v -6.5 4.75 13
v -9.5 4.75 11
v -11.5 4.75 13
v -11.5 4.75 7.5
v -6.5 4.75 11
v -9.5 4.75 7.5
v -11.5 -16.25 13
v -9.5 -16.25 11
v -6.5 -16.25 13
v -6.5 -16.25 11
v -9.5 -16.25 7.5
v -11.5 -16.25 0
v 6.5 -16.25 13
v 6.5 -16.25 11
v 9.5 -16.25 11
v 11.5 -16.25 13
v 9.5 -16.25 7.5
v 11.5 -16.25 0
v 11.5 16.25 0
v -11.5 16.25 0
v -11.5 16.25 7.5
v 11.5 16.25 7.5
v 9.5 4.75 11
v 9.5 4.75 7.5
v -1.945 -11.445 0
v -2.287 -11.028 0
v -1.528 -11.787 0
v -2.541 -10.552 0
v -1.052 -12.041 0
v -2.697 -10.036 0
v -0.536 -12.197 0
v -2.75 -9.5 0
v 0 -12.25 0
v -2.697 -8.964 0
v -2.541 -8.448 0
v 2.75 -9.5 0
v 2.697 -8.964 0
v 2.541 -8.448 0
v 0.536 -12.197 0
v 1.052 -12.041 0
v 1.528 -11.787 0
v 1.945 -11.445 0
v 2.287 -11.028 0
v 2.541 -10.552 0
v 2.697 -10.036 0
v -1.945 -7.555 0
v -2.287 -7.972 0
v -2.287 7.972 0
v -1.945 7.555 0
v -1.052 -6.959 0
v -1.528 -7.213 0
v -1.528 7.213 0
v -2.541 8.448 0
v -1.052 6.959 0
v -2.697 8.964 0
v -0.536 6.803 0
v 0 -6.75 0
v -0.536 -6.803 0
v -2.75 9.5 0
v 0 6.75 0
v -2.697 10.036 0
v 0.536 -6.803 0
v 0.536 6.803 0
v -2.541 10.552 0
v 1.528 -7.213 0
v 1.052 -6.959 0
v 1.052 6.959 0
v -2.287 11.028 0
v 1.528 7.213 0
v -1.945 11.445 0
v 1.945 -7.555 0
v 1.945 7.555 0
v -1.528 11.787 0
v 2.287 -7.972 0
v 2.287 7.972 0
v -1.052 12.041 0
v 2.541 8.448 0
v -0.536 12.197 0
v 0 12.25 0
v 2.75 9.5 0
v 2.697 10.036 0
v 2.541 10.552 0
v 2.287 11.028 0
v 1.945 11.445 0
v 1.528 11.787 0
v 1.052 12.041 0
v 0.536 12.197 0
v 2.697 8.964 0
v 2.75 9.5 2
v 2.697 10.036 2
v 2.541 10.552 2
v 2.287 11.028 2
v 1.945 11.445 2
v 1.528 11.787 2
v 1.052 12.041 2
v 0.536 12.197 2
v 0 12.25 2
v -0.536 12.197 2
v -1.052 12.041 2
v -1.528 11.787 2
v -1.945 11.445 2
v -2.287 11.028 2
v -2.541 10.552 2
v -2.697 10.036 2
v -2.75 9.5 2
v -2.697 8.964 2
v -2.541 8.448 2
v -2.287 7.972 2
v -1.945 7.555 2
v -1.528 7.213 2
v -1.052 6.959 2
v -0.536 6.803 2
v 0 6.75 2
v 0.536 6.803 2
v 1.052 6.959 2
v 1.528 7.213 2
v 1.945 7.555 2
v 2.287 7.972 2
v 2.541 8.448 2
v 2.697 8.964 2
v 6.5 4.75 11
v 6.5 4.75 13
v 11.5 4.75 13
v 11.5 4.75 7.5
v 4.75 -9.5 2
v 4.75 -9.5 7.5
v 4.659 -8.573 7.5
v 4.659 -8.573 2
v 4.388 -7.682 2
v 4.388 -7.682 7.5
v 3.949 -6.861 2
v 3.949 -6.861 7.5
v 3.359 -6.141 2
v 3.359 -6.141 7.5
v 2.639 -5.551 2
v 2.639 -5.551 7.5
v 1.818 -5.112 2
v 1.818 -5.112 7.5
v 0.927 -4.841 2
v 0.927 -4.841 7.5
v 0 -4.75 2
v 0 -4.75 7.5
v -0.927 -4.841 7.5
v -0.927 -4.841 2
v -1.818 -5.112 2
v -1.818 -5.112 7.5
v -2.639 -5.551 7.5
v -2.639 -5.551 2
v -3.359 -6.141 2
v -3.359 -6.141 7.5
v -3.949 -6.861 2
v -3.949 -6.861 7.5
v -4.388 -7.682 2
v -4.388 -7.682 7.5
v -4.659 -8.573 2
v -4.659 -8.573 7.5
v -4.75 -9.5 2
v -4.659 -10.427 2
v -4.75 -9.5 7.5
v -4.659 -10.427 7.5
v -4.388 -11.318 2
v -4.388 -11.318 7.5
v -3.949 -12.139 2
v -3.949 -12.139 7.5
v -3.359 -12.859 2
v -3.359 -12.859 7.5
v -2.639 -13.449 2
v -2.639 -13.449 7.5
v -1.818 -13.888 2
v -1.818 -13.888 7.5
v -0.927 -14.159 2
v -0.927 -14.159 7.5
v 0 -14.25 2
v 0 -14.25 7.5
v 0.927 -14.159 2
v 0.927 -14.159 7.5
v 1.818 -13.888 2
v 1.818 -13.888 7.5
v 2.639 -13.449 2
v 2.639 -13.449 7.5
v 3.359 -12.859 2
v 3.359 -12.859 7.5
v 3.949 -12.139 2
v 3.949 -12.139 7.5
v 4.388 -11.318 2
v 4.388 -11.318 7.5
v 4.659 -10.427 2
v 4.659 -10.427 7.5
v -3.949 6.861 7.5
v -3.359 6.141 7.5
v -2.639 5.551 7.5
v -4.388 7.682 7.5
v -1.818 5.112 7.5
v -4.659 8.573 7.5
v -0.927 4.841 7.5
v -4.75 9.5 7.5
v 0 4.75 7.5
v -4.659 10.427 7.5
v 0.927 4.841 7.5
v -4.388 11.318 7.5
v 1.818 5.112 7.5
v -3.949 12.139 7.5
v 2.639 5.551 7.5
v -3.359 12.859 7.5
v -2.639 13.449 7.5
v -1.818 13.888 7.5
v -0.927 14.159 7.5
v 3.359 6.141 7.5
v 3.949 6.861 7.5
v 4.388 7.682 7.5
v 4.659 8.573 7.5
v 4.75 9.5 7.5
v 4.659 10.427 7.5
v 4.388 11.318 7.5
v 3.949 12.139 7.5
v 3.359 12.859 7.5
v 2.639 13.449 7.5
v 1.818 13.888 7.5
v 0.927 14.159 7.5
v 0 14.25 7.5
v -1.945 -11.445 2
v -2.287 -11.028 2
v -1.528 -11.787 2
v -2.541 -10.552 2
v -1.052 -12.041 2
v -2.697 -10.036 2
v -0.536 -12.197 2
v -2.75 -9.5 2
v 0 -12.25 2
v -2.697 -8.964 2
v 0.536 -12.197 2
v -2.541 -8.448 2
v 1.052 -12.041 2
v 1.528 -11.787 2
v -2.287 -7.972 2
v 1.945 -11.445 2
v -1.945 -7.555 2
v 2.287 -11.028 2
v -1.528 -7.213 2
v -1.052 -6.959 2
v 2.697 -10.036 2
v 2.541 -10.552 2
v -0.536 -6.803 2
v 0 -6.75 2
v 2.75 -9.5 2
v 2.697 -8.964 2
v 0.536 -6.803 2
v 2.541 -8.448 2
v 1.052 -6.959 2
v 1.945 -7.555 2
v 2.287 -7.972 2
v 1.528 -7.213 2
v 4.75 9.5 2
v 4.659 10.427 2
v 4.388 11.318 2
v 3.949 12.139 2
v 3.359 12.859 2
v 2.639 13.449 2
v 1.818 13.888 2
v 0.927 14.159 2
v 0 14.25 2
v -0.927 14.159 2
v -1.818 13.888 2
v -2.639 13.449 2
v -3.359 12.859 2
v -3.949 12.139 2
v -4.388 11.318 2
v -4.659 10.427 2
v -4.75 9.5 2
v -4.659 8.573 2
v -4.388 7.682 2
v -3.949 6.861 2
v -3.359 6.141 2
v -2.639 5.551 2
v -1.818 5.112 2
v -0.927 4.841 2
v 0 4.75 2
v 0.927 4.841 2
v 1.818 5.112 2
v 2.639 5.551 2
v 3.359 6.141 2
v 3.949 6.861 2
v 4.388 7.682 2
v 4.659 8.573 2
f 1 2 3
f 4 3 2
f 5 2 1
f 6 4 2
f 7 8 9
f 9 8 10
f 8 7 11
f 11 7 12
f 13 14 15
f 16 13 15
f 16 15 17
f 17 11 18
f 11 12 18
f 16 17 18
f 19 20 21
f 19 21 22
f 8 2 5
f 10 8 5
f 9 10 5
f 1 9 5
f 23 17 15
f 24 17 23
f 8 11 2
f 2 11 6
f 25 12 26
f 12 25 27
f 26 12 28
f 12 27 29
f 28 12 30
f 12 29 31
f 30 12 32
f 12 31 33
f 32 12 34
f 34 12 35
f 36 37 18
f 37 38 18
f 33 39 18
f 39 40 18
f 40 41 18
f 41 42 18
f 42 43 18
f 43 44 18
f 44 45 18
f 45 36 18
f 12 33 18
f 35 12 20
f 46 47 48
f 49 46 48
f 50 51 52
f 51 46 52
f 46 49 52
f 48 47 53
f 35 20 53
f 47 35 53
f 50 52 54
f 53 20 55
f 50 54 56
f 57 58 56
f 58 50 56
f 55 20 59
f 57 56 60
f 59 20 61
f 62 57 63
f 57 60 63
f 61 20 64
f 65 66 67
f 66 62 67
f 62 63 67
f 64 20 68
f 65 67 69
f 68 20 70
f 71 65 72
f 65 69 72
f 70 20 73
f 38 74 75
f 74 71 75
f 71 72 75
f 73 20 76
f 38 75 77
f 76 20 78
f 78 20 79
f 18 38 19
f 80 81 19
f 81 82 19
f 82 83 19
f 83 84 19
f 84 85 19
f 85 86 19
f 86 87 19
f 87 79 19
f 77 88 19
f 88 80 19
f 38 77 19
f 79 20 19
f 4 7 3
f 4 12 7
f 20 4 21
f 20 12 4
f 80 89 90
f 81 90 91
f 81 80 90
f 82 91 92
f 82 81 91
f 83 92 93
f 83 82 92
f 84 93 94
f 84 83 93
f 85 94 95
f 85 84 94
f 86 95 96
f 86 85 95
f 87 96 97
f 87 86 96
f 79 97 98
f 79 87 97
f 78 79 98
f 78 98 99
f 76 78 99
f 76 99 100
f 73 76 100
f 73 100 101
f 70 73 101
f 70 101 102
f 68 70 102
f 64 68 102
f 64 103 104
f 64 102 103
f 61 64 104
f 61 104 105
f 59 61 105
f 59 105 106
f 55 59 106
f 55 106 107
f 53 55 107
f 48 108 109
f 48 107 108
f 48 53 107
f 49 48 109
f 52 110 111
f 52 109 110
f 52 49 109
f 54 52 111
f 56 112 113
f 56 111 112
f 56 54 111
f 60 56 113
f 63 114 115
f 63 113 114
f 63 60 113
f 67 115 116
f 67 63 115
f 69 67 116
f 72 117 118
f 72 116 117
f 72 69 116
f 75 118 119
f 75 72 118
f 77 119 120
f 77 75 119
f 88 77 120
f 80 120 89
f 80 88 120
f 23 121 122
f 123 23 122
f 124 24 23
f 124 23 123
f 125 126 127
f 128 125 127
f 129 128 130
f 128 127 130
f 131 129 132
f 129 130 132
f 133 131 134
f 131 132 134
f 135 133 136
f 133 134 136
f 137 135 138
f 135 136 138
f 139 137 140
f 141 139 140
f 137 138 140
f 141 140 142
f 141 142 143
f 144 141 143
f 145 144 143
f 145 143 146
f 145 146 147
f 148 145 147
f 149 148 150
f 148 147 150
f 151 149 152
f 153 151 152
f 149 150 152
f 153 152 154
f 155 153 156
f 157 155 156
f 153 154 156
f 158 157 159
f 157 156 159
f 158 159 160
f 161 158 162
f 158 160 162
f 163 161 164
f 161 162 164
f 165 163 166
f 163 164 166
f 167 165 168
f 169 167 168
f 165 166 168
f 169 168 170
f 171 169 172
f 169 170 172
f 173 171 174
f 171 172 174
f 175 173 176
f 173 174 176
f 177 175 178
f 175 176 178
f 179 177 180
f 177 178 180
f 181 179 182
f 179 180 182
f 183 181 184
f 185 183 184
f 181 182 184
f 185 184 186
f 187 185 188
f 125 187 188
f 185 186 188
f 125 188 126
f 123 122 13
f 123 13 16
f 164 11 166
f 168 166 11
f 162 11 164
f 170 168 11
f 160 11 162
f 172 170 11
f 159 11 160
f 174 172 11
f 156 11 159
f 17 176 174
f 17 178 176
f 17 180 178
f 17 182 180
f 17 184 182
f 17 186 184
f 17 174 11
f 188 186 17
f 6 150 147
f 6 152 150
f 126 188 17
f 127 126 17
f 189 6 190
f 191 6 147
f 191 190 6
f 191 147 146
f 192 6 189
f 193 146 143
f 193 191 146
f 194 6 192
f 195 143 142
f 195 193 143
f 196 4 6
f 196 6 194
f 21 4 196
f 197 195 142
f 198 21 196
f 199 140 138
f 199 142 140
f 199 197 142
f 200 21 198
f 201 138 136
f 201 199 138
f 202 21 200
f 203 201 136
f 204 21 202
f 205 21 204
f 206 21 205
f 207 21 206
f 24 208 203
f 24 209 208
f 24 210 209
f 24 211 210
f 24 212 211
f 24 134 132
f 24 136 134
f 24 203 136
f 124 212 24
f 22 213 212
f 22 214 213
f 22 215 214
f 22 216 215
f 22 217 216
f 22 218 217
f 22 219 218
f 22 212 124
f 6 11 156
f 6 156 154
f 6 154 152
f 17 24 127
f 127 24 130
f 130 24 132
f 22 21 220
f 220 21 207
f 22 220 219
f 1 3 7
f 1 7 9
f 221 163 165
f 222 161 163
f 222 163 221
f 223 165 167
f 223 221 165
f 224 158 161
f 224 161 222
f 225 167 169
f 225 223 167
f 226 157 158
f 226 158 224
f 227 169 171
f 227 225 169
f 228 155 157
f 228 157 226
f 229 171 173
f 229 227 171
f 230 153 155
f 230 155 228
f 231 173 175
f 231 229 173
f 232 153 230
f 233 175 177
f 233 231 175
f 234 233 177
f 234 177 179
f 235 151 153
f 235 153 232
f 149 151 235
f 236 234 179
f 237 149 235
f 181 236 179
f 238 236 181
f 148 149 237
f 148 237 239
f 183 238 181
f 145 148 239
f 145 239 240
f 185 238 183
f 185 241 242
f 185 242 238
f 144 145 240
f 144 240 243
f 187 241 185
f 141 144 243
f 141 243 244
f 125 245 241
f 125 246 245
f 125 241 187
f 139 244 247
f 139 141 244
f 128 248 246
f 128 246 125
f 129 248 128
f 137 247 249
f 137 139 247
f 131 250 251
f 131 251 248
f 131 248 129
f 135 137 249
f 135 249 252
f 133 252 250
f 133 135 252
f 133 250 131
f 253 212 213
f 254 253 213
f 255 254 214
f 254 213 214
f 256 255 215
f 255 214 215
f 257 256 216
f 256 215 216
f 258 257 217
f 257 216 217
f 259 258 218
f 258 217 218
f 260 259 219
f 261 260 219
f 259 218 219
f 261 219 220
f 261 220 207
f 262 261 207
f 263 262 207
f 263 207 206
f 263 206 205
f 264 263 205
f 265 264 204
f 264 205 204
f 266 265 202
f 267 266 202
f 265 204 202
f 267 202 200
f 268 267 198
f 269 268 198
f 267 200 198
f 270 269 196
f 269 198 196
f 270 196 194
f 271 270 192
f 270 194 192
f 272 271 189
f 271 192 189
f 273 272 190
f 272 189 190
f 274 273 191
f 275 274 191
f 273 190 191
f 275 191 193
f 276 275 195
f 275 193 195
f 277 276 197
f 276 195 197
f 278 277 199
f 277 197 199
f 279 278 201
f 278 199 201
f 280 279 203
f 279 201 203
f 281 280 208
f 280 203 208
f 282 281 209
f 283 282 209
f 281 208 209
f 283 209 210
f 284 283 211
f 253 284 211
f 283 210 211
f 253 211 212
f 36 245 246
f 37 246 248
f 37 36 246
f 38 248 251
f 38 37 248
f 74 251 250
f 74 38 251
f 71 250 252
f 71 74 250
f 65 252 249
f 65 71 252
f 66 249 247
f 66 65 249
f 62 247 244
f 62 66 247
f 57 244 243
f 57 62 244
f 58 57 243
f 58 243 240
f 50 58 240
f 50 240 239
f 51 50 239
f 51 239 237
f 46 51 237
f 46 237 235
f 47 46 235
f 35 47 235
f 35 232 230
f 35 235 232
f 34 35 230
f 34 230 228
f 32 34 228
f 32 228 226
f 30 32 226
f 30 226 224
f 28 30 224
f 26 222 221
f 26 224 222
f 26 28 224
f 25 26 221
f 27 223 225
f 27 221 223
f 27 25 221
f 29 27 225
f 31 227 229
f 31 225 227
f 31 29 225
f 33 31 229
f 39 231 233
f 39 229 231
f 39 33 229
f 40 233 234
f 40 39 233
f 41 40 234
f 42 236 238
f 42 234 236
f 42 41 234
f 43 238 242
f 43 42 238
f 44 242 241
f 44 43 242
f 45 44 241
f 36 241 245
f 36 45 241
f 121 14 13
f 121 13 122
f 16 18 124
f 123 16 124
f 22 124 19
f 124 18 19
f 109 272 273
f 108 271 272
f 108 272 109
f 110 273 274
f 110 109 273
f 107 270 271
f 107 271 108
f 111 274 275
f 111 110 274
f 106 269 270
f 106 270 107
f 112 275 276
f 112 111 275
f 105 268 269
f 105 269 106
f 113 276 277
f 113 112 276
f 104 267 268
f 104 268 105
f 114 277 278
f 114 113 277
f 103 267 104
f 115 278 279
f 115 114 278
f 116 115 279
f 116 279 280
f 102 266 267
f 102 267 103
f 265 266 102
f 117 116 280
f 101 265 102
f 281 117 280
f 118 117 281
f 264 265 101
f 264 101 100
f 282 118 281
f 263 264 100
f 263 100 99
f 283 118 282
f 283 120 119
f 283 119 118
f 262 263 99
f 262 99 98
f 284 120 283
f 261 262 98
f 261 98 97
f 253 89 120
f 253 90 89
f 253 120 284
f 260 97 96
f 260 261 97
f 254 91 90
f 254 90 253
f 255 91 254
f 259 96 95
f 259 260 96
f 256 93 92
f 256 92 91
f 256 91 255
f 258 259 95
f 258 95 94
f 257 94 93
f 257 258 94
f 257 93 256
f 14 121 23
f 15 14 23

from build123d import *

# Parameters (mm, degrees)
F0_W     = 23
F0_H     = 32.5
F0_R     = 2.75
F1_DEPTH = 7.5
F2_R     = 4.75
F3_DEPTH = 5.5
F4_W     = 2
F4_H     = 21
F5_DEPTH = 3.5
F6_W     = 5
F6_H     = 21
F7_DEPTH = 2


with BuildPart() as f1:
    # F0 (on Top) → F1 (new body)
    with BuildSketch(Plane.XY):
        Rectangle(F0_W, F0_H)
        with Locations((0, -9.5)):
            Circle(F0_R, mode=Mode.SUBTRACT)
        with Locations((0, 9.5)):
            Circle(F0_R, mode=Mode.SUBTRACT)
    extrude(amount=F1_DEPTH)

    # F2 (on face) → F3 (cut)
    with BuildSketch(Plane.XY.offset(7.5)):
        with Locations((0, -9.5)):
            Circle(F2_R)
        with Locations((0, 9.5)):
            Circle(F2_R)
    extrude(amount=-F3_DEPTH, mode=Mode.SUBTRACT)

    # F4 (on face) → F5 (join)
    with BuildSketch(Plane.XY.offset(7.5)):
        with Locations((-10.5, -5.75)):
            Rectangle(F4_W, F4_H)
        with Locations((10.5, -5.75)):
            Rectangle(F4_W, F4_H)
    extrude(amount=F5_DEPTH)

    # F6 (on face) → F7 (join)
    with BuildSketch(Plane.XY.offset(11)):
        with Locations((-9, -5.75)):
            Rectangle(F6_W, F6_H)
        with Locations((9, -5.75)):
            Rectangle(F6_W, F6_H)
    extrude(amount=F7_DEPTH)


solid = f1.part
